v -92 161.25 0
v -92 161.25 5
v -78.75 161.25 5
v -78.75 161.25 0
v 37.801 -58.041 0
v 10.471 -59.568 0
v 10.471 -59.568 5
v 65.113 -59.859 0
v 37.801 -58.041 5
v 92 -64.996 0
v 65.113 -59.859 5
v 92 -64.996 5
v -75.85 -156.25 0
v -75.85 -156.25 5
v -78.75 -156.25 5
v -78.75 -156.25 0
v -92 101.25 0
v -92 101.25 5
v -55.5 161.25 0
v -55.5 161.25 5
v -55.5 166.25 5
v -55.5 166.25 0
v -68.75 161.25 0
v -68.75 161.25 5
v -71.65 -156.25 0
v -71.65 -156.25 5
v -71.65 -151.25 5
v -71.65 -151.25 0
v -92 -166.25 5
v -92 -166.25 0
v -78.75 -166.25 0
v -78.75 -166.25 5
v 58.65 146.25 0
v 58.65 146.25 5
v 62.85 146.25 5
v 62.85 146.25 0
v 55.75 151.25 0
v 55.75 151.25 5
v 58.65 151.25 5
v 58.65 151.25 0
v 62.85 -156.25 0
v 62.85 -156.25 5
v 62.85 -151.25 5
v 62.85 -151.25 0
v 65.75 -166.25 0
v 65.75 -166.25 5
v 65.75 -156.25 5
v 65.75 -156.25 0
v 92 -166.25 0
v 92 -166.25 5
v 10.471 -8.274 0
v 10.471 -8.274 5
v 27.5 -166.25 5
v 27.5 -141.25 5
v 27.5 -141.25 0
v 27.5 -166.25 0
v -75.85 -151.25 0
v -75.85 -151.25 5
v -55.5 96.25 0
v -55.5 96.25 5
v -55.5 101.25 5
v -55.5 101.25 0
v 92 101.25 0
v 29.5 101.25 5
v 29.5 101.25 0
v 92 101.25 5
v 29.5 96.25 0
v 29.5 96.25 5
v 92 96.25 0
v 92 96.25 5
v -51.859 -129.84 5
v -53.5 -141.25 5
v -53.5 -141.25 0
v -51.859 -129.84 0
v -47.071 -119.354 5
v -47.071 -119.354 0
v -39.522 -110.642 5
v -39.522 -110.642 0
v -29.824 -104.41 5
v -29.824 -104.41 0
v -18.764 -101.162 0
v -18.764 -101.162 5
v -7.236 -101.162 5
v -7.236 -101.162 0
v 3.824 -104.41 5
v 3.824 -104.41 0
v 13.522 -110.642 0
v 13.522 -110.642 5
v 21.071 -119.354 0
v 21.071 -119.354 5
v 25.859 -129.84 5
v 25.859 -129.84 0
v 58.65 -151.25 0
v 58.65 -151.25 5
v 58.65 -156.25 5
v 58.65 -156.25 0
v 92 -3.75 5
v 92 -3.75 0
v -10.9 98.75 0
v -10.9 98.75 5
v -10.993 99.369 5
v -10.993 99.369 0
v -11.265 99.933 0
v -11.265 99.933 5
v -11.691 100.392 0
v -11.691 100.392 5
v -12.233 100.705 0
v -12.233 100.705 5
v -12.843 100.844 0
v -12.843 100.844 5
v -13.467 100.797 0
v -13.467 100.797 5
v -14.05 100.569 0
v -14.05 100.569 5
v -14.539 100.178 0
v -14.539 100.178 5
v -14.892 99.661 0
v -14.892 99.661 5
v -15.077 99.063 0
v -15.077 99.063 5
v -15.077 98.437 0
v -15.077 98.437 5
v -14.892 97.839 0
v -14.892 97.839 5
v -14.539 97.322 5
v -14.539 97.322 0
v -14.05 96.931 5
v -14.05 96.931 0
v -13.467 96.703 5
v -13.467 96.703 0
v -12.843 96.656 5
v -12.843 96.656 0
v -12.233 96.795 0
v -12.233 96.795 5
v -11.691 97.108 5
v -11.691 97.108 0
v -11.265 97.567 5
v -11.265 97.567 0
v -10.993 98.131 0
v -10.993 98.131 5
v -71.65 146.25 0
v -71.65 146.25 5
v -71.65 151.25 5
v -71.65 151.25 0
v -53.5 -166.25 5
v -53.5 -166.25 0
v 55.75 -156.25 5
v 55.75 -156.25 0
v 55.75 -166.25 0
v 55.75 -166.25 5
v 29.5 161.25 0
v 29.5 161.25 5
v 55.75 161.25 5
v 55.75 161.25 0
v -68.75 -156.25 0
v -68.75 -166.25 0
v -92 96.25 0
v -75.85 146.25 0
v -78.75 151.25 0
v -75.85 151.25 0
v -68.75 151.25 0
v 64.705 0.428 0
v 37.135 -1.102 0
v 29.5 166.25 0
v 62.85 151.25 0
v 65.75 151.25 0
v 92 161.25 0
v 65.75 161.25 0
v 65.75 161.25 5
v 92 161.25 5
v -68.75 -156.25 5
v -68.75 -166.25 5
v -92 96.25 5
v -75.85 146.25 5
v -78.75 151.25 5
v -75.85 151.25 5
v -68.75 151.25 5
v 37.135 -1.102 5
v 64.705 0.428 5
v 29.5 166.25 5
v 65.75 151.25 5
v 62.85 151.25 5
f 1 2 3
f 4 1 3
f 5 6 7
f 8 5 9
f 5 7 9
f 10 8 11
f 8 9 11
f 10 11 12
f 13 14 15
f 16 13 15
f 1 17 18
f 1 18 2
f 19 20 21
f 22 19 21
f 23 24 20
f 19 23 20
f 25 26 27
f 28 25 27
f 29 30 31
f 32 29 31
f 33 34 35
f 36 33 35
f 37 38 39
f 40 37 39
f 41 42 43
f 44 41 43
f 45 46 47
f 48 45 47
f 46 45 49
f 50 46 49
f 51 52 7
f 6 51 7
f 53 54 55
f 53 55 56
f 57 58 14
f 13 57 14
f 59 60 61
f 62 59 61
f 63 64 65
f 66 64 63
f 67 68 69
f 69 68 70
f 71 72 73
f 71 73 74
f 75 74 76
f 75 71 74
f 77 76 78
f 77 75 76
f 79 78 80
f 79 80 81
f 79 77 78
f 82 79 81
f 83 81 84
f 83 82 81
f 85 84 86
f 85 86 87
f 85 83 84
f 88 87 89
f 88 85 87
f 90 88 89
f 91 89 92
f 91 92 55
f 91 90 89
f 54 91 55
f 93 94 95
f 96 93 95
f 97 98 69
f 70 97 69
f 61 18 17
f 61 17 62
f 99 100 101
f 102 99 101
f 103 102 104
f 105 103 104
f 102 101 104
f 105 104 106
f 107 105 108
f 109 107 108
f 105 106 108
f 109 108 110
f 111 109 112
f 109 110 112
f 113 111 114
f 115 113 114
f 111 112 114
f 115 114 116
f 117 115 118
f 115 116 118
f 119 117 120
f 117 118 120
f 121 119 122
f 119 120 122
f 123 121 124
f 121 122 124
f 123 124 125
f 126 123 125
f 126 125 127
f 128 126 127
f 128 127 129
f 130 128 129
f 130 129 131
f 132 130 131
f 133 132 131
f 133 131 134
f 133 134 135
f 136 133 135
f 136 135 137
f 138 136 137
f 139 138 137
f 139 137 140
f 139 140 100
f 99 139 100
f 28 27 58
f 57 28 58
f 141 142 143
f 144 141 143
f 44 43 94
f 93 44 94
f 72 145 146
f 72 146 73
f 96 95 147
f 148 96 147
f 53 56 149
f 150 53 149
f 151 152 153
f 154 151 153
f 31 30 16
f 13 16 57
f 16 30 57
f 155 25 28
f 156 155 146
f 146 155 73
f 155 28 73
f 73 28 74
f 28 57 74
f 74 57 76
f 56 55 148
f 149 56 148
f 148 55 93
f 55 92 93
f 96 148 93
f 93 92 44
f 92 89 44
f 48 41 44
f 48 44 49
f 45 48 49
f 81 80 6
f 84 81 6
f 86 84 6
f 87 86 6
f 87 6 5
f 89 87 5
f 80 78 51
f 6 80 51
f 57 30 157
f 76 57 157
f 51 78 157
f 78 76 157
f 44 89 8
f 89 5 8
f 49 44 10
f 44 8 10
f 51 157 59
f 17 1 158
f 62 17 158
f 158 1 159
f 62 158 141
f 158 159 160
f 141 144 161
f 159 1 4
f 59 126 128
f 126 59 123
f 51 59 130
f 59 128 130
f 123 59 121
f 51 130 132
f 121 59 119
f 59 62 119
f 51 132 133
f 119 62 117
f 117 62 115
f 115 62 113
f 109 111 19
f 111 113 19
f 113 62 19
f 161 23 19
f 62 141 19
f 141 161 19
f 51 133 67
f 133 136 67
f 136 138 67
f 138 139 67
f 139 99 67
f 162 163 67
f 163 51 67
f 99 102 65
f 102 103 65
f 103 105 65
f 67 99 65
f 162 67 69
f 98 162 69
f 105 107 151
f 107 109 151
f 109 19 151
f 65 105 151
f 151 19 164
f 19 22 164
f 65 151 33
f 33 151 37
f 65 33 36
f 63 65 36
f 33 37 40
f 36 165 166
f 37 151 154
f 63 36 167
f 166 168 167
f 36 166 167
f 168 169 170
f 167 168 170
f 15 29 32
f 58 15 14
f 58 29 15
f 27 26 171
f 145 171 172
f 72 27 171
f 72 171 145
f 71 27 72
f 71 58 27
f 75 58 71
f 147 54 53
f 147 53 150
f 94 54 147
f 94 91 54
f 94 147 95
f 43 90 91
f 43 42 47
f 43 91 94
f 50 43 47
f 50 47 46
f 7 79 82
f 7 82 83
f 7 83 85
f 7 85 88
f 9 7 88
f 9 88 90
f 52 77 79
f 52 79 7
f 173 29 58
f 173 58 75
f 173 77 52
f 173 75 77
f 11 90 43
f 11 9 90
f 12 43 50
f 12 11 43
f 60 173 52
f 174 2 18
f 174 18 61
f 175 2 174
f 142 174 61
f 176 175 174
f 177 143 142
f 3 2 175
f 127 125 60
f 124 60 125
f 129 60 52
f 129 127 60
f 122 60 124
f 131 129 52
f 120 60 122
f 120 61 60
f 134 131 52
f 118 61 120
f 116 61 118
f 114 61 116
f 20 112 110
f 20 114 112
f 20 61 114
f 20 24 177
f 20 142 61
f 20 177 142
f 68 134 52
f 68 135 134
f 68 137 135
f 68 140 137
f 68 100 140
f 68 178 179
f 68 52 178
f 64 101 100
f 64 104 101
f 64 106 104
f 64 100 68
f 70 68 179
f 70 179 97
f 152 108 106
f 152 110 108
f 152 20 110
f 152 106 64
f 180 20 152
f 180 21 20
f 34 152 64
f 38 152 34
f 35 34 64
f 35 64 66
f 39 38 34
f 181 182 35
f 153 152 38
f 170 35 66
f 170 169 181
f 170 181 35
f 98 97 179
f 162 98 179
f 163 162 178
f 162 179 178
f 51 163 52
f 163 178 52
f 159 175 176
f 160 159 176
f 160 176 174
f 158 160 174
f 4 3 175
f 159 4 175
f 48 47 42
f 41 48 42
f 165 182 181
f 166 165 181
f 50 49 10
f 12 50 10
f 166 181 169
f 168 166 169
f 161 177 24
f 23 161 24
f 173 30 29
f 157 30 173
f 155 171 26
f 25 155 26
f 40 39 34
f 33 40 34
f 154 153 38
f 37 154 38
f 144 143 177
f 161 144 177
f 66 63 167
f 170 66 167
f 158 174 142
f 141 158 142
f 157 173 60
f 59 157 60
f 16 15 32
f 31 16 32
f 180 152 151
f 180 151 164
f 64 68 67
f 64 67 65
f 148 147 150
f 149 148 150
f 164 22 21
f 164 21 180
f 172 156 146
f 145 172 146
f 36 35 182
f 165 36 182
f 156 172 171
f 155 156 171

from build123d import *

# Parameters (mm, degrees)
SKETCH2_W               = 184
SKETCH2_H               = 332.5
BOSS_EXTRUDE1_DEPTH     = 5
SKETCH3_W               = 36.5
SKETCH3_H               = 5
SKETCH3_W_2             = 62.5
CUT_EXTRUDE1_DEPTH      = 5
CUT_EXTRUDE2_DEPTH      = 10
SKETCH5_R               = 2.1
CUT_EXTRUDE3_DEPTH      = 10
ENL_V_MAT_EXTRU_2_DEPTH = 10


with BuildPart() as part:
    # Sketch2 → Boss-Extrude1 (new body)
    with BuildSketch(Plane.XY):
        Rectangle(SKETCH2_W, SKETCH2_H)
    extrude(amount=BOSS_EXTRUDE1_DEPTH)

    # Sketch3 → Cut-Extrude1 (cut)
    with BuildSketch(Plane.XY.offset(5)):
        with Locations((-73.75, 163.75)):
            Rectangle(SKETCH3_W, SKETCH3_H)
        with Locations((60.75, 163.75)):
            Rectangle(SKETCH3_W_2, SKETCH3_H)
        with Locations((60.75, 98.75)):
            Rectangle(SKETCH3_W_2, SKETCH3_H)
        with BuildLine():
            Line((27.5, -141.25), (27.5, -166.25))
            Line((27.5, -166.25), (-53.5, -166.25))
            Line((-53.5, -166.25), (-53.5, -141.25))
            ThreePointArc((-53.5, -141.25), (-13, -100.75), (27.5, -141.25))
        make_face()
        with Locations((-73.75, 98.75)):
            Rectangle(SKETCH3_W, SKETCH3_H)
    extrude(amount=-CUT_EXTRUDE1_DEPTH, mode=Mode.SUBTRACT)

    # Sketch4 → Cut-Extrude2 (cut)
    with BuildSketch(Plane.XY.offset(5)):
        Polygon((55.75, 161.25), (55.75, 151.25), (58.65, 151.25), (58.65, 146.25), (62.85, 146.25), (62.85, 151.25), (65.75, 151.25), (65.75, 161.25), align=None)
        Polygon((-78.75, 161.25), (-78.75, 151.25), (-75.85, 151.25), (-75.85, 146.25), (-71.65, 146.25), (-71.65, 151.25), (-68.75, 151.25), (-68.75, 161.25), align=None)
        Polygon((65.75, -166.25), (65.75, -156.25), (62.85, -156.25), (62.85, -151.25), (58.65, -151.25), (58.65, -156.25), (55.75, -156.25), (55.75, -166.25), align=None)
        Polygon((-68.75, -166.25), (-68.75, -156.25), (-71.65, -156.25), (-71.65, -151.25), (-75.85, -151.25), (-75.85, -156.25), (-78.75, -156.25), (-78.75, -166.25), align=None)
    extrude(amount=-CUT_EXTRUDE2_DEPTH, mode=Mode.SUBTRACT)

    # Sketch5 → Cut-Extrude3 (cut)
    with BuildSketch(Plane.XY.offset(5)):
        with Locations((-13, 98.75)):
            Circle(SKETCH5_R)
    extrude(amount=-CUT_EXTRUDE3_DEPTH, mode=Mode.SUBTRACT)

    # Esquisse2 → Enlèv. mat.-Extru.2 (cut)
    with BuildSketch(Plane.XY.offset(5)):
        with BuildLine():
            Line((10.470660362, -8.273773364), (10.470660362, -59.567669296))
            ThreePointArc((10.470660362, -59.567669296), (51.484945295, -58.532619163), (92, -64.995841242))
            Line((92, -64.995841242), (92, -3.75037767))
            ThreePointArc((92, -3.75037767), (50.880784547, 0.378228003), (10.470660362, -8.273773364))
        make_face()
    extrude(amount=-ENL_V_MAT_EXTRU_2_DEPTH, mode=Mode.SUBTRACT)


solid = part.part
